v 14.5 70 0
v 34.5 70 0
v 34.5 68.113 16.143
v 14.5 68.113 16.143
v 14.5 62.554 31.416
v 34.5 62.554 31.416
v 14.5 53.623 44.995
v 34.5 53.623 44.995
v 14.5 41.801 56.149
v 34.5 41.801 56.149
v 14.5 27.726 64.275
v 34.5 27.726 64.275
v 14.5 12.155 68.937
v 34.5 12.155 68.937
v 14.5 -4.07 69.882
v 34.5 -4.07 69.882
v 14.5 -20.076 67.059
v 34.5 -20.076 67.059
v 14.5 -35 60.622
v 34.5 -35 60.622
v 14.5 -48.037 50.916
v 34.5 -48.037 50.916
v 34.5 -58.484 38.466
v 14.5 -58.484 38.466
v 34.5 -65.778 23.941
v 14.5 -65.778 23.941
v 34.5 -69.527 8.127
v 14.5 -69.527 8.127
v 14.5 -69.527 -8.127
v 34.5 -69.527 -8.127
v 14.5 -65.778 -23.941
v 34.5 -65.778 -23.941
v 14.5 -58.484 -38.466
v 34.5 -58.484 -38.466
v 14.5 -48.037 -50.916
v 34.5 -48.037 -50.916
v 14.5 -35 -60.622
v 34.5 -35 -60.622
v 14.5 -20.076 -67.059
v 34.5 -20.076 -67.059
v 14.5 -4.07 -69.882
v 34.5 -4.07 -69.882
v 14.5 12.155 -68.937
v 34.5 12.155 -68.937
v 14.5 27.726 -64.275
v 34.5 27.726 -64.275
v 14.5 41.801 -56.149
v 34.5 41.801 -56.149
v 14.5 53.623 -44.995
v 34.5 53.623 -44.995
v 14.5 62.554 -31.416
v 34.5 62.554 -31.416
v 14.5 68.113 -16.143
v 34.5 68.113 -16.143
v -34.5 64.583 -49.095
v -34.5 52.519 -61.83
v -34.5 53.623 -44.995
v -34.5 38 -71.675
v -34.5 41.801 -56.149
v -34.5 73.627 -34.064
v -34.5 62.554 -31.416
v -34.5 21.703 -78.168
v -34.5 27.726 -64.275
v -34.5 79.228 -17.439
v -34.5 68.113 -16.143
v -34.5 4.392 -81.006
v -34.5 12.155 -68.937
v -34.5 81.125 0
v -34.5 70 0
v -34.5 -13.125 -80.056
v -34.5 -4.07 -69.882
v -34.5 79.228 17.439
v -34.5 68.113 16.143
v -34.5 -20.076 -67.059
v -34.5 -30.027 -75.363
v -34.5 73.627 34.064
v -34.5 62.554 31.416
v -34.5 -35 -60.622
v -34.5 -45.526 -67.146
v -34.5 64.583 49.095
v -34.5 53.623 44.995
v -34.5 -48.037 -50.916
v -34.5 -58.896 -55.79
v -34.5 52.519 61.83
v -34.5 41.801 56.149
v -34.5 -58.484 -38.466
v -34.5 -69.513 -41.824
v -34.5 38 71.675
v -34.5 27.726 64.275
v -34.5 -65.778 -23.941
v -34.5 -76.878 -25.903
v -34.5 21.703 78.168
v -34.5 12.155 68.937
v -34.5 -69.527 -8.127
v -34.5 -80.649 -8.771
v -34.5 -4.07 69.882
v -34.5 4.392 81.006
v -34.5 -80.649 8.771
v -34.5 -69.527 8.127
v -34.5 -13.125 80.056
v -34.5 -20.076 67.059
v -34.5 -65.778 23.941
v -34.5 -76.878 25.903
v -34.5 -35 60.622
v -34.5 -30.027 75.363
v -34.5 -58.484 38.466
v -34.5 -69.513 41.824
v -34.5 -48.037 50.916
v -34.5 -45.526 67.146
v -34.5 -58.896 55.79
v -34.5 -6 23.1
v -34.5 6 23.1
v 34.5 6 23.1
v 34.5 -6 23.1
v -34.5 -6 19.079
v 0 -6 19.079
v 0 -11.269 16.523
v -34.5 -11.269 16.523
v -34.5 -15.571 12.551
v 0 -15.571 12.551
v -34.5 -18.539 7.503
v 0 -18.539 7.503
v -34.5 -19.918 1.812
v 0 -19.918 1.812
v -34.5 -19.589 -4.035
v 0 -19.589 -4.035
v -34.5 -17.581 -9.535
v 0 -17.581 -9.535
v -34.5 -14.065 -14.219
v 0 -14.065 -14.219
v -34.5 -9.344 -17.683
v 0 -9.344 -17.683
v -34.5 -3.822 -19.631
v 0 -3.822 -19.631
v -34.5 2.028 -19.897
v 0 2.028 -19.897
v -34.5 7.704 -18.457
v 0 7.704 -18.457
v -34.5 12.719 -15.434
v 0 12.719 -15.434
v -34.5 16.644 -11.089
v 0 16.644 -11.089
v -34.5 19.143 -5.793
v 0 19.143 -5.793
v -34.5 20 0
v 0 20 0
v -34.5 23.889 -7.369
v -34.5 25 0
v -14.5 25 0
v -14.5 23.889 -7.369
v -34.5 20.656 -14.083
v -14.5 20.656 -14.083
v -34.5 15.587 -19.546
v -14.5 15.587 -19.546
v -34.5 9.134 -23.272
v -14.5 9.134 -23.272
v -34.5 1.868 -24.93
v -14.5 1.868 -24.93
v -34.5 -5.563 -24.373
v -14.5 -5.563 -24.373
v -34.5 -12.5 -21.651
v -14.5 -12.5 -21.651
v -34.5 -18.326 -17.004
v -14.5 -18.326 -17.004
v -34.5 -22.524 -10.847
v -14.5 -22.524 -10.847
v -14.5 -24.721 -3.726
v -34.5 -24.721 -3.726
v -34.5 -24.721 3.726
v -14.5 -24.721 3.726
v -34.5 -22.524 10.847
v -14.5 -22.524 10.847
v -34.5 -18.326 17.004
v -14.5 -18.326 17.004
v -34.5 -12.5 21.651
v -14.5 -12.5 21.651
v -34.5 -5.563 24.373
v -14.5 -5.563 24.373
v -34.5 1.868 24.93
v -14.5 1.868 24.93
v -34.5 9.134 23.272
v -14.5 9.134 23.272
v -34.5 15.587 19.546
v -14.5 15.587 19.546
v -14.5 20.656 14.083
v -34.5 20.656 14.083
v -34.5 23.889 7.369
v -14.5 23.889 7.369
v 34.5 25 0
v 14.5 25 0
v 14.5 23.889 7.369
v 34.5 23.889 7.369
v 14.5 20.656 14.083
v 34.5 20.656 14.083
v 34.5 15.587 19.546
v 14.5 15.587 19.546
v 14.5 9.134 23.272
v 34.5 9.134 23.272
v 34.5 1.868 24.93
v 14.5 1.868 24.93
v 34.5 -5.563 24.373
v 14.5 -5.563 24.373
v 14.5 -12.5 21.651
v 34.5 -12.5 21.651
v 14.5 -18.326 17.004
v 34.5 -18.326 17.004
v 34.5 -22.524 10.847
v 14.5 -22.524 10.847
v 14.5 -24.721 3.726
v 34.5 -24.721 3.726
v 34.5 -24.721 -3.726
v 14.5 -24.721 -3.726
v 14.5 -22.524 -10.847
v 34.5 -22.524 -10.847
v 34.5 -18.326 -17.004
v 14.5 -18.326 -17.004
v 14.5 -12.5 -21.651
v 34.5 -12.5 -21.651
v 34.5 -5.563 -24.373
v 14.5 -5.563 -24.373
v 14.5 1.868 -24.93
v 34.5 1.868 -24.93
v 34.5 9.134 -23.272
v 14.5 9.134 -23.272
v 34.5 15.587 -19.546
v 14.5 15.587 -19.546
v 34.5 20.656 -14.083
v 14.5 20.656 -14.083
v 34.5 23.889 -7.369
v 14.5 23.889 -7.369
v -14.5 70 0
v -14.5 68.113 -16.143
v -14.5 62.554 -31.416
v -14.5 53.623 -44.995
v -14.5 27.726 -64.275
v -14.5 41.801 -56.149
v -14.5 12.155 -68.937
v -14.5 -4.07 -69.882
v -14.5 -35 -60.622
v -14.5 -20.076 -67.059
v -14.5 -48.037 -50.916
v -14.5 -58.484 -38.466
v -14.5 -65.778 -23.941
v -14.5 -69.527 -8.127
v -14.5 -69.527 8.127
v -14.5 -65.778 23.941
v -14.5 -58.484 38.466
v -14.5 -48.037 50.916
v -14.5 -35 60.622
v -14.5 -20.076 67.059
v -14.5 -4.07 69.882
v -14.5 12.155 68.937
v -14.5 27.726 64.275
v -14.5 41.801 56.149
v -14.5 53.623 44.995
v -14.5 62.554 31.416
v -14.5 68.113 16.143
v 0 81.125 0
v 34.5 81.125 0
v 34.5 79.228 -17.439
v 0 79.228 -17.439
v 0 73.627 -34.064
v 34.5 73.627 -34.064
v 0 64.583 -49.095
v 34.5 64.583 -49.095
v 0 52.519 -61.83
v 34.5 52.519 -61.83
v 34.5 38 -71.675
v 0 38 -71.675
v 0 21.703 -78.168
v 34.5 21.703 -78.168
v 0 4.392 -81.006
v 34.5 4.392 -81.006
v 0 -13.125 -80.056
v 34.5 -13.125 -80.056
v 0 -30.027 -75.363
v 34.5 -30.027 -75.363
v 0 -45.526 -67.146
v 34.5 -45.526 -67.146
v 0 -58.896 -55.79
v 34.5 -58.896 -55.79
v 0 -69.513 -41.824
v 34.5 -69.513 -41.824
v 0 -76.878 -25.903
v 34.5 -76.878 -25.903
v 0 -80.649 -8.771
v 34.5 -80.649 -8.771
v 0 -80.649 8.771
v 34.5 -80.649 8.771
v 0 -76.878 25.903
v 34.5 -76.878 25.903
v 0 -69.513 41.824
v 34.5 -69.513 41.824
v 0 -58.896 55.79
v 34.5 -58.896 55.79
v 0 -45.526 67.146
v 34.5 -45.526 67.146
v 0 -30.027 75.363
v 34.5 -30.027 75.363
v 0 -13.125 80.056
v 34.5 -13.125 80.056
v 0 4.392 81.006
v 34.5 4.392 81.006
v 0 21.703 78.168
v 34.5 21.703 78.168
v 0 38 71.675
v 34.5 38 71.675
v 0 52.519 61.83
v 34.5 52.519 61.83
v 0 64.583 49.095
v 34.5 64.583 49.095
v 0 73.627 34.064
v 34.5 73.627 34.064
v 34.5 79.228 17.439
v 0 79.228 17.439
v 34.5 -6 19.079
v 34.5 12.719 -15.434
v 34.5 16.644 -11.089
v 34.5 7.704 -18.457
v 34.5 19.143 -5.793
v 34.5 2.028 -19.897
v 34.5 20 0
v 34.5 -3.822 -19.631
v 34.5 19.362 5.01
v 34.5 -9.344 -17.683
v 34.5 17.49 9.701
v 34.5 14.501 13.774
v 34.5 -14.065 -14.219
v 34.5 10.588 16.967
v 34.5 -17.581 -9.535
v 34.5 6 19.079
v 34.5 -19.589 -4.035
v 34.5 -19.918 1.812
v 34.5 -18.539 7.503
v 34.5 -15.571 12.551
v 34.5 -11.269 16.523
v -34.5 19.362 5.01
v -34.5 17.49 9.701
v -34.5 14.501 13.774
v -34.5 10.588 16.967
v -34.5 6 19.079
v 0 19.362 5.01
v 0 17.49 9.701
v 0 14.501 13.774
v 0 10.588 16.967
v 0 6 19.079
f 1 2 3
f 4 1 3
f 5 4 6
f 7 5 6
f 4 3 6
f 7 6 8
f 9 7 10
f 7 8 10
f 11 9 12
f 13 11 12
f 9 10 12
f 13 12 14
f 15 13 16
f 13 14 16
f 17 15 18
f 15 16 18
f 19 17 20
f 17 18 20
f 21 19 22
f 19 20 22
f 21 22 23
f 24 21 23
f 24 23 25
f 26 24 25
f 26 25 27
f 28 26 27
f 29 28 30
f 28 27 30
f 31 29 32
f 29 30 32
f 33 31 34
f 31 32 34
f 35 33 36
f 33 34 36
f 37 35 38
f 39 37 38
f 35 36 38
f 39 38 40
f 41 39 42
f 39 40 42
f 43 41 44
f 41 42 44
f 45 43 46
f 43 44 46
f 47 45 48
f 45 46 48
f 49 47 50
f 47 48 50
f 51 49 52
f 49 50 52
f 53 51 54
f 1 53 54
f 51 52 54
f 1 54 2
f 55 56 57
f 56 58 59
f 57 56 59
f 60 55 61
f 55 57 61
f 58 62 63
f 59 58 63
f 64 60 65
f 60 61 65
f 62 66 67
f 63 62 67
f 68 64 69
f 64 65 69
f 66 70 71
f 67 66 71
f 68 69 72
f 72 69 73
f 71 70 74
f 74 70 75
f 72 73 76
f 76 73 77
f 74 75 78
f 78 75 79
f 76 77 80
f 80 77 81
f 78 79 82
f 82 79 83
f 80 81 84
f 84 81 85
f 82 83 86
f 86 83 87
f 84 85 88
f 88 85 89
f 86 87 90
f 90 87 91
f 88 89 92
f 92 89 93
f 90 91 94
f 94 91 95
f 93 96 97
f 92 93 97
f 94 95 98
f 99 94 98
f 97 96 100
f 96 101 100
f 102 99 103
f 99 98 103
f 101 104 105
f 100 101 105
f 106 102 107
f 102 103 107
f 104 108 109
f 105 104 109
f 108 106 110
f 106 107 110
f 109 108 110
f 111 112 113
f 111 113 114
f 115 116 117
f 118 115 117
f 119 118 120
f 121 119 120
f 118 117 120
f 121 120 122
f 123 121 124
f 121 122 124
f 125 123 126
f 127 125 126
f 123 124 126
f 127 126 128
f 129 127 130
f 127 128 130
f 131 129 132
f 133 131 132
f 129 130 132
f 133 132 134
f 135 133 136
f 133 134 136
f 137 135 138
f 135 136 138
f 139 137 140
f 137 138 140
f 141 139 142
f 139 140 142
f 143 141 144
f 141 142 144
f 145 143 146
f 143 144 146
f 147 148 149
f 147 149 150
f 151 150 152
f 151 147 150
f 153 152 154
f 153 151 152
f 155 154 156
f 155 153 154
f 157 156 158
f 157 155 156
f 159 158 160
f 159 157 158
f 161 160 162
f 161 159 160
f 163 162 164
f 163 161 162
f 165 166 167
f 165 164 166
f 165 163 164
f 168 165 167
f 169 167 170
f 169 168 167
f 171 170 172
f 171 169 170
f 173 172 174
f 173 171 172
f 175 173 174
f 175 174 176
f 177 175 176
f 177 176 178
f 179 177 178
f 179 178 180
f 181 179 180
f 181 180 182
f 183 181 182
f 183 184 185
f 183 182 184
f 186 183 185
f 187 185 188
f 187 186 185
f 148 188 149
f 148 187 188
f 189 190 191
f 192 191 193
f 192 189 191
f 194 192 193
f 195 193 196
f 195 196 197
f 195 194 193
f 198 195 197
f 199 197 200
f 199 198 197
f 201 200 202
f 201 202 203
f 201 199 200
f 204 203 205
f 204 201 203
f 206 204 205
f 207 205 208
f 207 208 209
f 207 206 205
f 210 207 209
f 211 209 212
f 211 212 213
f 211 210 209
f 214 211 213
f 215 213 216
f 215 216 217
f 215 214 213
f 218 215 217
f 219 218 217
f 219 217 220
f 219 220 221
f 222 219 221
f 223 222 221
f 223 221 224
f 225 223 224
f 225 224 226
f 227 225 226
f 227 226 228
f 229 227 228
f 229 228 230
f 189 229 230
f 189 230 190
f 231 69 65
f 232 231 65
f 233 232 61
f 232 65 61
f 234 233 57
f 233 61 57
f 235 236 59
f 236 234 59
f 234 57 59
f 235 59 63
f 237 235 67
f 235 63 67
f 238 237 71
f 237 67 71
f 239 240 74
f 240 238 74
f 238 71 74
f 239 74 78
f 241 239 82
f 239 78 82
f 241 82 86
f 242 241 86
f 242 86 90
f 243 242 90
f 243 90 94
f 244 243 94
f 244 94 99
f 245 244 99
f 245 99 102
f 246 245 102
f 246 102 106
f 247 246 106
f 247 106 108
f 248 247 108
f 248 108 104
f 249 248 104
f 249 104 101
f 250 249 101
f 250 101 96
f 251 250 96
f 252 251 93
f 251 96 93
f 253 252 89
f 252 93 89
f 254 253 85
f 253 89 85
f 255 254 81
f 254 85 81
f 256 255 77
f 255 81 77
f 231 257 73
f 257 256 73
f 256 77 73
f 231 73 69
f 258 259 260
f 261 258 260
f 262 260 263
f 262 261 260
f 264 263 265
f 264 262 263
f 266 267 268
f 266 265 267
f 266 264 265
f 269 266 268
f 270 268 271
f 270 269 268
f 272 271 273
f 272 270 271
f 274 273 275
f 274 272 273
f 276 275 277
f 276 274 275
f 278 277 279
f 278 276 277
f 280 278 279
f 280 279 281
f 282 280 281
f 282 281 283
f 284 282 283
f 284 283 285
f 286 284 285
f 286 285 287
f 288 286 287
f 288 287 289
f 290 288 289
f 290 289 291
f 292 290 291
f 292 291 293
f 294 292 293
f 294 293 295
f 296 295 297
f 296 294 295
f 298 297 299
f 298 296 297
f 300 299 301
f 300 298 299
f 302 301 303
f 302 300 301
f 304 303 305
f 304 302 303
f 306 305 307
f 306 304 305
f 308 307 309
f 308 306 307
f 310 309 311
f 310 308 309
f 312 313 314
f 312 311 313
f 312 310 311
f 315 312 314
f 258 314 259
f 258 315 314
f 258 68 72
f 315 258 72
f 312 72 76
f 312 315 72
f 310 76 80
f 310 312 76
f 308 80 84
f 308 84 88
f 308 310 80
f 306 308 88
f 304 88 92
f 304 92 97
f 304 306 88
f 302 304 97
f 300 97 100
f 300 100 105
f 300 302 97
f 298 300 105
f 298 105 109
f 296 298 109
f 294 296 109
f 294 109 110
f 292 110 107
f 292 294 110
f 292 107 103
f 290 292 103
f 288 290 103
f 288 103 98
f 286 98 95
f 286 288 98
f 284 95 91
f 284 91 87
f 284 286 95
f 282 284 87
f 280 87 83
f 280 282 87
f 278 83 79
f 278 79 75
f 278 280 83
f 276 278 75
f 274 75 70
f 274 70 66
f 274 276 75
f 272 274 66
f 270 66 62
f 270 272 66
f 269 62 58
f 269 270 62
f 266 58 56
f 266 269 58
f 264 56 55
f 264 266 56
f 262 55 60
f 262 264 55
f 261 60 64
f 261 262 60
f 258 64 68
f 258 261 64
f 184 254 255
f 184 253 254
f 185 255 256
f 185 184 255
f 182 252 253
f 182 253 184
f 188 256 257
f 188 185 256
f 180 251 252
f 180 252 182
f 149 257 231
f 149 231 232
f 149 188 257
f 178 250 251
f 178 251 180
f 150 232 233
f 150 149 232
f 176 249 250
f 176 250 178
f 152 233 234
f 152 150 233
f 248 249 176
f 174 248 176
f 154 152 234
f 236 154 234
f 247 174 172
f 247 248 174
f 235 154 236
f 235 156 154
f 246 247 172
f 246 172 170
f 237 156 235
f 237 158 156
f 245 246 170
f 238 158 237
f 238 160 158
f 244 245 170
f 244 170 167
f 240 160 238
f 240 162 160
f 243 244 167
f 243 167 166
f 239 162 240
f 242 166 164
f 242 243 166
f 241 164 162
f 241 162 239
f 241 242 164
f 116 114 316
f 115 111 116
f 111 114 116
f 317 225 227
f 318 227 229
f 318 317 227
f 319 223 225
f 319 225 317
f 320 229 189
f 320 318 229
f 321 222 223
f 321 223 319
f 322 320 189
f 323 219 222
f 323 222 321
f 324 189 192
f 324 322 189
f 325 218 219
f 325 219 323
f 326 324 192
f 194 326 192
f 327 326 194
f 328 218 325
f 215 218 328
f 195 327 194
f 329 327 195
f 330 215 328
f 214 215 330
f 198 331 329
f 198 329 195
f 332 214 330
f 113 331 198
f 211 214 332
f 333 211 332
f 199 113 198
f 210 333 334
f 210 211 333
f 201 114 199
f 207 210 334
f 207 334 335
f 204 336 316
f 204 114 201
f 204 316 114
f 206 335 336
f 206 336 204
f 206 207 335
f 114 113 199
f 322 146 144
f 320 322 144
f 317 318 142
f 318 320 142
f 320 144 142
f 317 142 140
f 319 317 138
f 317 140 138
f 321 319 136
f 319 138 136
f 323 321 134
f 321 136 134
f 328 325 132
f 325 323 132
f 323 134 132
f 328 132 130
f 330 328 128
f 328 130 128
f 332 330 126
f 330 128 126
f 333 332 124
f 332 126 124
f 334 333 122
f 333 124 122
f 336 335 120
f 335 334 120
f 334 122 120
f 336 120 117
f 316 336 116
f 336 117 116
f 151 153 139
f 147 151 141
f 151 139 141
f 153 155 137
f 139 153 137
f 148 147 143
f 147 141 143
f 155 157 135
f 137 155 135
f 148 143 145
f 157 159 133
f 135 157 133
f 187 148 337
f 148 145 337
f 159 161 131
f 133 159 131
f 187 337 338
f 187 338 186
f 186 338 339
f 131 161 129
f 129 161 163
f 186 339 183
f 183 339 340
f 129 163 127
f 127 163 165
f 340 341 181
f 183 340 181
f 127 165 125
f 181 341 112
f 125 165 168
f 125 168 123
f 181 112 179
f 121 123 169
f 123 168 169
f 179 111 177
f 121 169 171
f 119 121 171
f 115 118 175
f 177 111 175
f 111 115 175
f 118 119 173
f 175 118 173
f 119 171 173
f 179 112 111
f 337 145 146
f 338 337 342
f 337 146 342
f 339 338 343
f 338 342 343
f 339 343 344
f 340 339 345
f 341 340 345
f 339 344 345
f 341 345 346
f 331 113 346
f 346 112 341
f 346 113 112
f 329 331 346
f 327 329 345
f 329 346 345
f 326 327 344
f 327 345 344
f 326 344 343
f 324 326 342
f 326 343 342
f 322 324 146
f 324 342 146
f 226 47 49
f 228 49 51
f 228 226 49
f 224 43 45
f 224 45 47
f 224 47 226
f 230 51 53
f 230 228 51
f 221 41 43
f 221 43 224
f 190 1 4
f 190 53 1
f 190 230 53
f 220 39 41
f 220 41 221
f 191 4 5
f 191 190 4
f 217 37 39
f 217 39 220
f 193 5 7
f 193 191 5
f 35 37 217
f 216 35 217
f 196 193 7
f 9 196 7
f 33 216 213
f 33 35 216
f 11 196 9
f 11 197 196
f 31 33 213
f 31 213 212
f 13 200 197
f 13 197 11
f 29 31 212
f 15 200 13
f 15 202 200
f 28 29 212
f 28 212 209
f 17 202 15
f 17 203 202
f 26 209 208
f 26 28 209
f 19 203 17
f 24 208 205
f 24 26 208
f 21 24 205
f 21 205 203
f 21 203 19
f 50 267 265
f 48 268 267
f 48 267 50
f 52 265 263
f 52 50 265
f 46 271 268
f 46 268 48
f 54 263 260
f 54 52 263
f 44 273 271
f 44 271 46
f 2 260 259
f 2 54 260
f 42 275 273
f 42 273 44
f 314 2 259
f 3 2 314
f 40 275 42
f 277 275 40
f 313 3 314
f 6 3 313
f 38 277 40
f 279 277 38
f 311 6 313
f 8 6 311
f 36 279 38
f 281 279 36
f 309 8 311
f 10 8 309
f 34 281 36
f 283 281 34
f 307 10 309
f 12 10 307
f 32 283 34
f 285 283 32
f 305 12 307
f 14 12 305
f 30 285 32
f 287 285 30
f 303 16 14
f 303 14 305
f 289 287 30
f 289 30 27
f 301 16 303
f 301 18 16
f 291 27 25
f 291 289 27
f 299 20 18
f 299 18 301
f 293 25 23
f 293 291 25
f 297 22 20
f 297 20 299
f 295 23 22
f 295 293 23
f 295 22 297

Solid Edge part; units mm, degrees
sketch "Sketch1" plane through (0, 0, 0) normal (1, 0, 0) x (0, 1, 0)
  circle A0 centre (0, 0) radius 20
  circle A1 centre (0, 0) radius 81.125
extrude "Protrusion1" add sketch "Sketch1" along normal mid plane 69
sketch "Sketch2" plane through (34.5, 0, 0) normal (1, 0, 0) x (0, 1, 0)
  circle A0 centre (0, 0) radius 70
  circle A1 centre (0, 0) radius 25
extrude "VaciadoExtruido_1" cut sketch "Sketch2" against normal blind 20
mirror "Mirror1" about plane through (0, 0, 0) normal (1, 0, 0) of "VaciadoExtruido_1"
sketch "Sketch3" plane through (34.5, 0, 0) normal (1, 0, 0) x (0, 1, 0)
  line L0 (-6, 23.1) -> (-6, 19.0788)
  line L1 (6, 23.1) -> (6, 19.0788)
  line L2 (0, 23.1) -> (6, 23.1)
  line L3 (0, 23.1) -> (-6, 23.1)
  arc A0 (-6, 19.0788) -> (6, 19.0788) centre (0, 0) cw
extrude "Cutout2" cut sketch "Sketch3" along normal mid plane 200
properties material "Acero"
